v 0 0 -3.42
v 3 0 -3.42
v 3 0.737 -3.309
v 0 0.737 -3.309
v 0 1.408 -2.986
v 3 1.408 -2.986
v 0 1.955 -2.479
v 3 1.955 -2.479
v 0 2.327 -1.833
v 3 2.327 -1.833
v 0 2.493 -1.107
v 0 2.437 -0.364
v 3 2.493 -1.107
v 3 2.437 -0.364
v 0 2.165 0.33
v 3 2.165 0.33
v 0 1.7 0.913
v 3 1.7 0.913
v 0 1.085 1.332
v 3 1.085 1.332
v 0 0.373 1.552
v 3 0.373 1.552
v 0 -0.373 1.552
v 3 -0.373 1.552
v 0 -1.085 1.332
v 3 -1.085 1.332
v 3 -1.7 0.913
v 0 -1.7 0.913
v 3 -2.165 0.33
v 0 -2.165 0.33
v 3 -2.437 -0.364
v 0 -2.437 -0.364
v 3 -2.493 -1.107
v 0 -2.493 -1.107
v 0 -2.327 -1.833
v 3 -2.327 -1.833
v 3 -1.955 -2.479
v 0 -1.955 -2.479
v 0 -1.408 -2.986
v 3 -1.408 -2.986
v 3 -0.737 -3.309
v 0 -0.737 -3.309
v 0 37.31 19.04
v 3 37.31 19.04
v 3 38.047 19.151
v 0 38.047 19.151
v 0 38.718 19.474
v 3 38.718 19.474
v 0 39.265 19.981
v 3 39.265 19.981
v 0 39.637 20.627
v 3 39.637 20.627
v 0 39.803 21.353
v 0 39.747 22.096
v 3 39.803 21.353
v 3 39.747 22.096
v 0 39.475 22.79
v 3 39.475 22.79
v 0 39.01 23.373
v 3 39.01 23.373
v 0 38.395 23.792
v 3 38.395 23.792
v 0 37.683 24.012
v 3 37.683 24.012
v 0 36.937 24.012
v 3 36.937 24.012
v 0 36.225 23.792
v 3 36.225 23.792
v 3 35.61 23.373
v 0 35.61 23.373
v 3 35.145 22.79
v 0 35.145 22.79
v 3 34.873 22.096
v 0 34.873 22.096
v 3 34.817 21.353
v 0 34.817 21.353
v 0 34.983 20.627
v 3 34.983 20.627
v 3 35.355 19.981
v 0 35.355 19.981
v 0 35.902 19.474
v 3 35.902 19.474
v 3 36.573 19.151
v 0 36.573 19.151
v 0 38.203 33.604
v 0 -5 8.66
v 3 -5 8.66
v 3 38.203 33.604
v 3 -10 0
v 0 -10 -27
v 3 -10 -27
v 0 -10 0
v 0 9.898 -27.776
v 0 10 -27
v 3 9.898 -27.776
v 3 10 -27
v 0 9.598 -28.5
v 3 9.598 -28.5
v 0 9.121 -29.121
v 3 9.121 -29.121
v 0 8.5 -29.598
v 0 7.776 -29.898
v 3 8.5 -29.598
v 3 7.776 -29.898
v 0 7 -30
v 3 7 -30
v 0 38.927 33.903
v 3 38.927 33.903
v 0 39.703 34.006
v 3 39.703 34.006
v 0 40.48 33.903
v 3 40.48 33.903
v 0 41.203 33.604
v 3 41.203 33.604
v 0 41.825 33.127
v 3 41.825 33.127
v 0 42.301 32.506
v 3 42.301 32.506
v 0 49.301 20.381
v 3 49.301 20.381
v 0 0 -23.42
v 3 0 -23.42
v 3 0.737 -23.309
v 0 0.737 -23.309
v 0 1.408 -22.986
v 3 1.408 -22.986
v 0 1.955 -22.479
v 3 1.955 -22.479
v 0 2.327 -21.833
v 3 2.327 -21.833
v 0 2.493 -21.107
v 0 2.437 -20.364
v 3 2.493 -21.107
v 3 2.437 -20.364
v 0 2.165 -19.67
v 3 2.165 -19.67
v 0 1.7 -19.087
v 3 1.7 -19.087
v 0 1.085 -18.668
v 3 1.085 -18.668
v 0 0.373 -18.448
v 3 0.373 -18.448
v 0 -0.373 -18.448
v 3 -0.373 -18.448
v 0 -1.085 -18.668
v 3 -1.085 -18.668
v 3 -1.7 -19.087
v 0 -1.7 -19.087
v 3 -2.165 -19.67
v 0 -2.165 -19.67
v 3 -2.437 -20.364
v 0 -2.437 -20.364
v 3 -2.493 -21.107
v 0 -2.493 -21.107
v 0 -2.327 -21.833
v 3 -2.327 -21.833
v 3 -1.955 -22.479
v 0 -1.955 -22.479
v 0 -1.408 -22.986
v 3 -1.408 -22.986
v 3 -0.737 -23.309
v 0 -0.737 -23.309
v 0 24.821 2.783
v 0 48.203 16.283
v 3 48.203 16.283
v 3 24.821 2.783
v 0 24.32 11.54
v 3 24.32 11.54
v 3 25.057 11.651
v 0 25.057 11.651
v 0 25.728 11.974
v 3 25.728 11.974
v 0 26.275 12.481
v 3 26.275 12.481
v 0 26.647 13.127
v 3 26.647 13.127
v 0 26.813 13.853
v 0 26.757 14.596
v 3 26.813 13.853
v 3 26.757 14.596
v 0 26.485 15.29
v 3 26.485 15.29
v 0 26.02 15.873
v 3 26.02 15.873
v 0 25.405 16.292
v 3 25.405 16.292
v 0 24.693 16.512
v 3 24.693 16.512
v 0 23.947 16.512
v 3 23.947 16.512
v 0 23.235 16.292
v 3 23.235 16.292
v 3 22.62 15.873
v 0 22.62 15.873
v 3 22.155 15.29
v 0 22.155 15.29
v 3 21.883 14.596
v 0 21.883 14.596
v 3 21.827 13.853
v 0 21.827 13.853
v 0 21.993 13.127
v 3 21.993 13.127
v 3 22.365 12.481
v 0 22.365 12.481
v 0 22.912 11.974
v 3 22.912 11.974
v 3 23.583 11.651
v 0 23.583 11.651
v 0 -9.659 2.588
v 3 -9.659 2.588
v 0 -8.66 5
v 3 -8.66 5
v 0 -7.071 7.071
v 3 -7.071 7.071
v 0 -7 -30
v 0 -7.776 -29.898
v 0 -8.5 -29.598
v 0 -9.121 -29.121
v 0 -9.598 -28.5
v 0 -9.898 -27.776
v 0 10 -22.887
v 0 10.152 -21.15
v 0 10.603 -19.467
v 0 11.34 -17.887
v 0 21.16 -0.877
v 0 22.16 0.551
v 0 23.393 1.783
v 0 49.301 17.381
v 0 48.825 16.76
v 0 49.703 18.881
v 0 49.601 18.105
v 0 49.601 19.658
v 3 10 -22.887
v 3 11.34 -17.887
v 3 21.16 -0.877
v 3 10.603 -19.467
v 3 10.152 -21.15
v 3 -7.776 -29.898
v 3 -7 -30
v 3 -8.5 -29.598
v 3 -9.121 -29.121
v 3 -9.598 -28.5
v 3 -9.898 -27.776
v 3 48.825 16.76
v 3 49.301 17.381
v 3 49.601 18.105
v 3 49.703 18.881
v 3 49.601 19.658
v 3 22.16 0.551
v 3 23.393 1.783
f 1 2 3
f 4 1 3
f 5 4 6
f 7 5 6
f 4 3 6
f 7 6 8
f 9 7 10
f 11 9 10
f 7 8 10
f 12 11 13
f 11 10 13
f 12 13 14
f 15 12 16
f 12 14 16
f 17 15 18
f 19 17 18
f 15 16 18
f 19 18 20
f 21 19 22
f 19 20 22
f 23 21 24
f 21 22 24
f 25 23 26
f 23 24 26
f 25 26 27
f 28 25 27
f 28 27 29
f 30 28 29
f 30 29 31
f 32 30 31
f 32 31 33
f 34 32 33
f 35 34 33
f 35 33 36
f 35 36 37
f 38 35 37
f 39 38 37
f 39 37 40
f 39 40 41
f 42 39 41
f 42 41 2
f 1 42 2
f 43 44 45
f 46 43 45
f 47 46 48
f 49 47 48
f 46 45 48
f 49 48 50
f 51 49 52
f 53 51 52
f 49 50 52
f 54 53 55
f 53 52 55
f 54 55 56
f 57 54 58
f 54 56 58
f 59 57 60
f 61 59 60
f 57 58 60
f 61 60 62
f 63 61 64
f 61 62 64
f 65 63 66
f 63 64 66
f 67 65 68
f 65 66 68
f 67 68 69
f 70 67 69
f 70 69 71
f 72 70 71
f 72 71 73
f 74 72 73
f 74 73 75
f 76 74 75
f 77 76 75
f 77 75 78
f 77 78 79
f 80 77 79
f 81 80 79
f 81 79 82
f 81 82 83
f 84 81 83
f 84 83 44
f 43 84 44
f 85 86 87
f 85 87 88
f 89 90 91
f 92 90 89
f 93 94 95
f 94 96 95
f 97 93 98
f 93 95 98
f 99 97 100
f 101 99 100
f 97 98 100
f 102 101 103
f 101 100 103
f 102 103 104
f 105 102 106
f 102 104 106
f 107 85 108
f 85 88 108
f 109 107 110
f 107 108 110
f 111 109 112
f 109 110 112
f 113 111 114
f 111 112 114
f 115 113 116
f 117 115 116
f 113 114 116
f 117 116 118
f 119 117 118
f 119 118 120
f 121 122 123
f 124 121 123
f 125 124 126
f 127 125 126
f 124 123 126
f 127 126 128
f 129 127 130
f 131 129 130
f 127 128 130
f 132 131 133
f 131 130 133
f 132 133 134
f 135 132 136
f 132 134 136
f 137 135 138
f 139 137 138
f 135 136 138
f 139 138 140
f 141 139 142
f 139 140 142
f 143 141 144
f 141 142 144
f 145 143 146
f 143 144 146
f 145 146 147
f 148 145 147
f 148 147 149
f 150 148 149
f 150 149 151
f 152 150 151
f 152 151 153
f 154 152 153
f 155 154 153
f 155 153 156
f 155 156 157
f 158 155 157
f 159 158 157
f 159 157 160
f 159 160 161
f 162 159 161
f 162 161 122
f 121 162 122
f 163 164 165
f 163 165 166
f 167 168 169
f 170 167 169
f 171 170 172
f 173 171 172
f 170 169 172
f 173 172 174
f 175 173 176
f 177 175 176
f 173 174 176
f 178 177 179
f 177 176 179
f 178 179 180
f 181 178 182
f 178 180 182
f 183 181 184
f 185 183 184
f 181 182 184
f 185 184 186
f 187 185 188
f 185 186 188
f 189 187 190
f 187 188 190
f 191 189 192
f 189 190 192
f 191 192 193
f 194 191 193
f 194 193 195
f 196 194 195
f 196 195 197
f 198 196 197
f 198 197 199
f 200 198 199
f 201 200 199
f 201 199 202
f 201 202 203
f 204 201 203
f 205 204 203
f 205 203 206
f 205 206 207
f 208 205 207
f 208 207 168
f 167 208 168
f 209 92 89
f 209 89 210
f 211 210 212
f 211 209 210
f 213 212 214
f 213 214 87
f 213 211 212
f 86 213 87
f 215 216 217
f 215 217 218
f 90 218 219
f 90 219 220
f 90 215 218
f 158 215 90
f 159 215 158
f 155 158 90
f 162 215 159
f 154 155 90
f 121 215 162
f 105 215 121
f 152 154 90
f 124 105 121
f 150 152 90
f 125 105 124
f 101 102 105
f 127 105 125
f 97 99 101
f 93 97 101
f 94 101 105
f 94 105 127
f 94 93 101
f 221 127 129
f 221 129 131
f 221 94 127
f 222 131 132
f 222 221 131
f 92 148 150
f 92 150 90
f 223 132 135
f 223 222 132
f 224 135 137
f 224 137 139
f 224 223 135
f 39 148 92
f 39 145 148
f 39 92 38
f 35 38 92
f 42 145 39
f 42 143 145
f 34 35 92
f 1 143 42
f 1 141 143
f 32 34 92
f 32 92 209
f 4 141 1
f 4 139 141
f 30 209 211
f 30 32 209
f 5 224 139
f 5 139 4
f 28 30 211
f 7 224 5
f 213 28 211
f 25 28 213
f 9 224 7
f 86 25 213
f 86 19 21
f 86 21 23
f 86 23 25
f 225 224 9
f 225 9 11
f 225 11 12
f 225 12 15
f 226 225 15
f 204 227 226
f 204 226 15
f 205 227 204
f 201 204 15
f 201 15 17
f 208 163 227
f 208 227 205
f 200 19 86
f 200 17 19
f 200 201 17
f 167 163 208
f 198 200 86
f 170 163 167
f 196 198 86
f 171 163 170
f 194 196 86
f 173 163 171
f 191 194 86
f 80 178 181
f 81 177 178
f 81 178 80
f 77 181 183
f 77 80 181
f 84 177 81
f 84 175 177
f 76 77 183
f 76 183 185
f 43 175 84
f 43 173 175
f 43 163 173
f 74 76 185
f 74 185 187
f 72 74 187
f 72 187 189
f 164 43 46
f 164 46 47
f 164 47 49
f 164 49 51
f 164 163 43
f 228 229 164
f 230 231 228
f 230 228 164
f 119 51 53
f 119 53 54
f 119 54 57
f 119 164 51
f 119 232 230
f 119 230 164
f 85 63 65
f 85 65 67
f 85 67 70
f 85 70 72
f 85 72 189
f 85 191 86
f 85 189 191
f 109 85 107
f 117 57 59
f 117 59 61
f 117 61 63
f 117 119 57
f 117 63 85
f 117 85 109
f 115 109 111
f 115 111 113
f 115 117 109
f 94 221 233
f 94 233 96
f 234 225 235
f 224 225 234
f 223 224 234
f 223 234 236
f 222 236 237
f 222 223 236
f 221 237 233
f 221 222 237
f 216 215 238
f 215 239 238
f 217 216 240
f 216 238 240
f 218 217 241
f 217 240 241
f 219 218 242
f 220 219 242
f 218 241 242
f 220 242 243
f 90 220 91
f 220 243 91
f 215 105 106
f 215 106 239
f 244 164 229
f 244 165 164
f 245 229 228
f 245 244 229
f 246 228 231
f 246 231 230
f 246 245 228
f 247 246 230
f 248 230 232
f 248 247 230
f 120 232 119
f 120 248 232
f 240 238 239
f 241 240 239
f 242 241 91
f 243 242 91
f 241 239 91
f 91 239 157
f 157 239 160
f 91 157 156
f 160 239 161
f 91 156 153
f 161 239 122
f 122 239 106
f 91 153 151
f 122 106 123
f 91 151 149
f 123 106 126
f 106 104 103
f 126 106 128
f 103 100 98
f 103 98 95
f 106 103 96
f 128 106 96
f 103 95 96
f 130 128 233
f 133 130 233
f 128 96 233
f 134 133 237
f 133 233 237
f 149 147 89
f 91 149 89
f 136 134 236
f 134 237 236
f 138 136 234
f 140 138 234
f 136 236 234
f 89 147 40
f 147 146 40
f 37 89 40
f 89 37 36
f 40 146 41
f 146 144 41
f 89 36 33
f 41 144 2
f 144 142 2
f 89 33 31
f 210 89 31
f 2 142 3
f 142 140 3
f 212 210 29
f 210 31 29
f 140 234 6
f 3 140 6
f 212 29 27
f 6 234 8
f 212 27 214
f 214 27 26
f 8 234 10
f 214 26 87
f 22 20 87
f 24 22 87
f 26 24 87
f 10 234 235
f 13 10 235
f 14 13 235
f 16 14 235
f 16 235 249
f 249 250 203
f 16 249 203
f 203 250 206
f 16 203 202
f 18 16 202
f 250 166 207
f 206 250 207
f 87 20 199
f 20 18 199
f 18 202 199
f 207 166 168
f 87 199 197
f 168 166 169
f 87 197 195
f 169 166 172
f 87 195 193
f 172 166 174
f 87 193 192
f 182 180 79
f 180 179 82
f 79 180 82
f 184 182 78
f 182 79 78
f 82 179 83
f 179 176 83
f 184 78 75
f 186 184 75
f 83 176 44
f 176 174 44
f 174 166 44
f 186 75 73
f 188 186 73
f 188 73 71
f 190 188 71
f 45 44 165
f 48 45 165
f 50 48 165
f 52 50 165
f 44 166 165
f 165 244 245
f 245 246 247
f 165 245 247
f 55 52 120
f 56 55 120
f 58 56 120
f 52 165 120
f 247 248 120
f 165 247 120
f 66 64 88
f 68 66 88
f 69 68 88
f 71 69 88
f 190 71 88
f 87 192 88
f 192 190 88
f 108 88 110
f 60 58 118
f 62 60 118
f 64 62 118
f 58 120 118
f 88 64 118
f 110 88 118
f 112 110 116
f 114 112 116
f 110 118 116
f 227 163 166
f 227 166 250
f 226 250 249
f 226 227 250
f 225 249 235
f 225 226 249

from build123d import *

# Parameters (mm, degrees)
BOSS_EXTRUDE1_DEPTH = 3
SKETCH2_R           = 2.5
CUT_EXTRUDE1_DEPTH  = 62.822600008
FILLET1_R           = 3


with BuildPart() as part:
    # Sketch1 → Boss-Extrude1 (new body)
    with BuildSketch(Plane(origin=(0, 0, 0), x_dir=(0, 0, -1), z_dir=(1, 0, 0))):
        with BuildLine():
            Line((22.886751346, 10), (30, 10))
            Line((30, 10), (30, -10))
            Line((30, -10), (0, -10))
            ThreePointArc((0, -10), (-5, -8.660254038), (-8.660254038, -5))
            Line((-8.660254038, -5), (-35.103629711, 40.801270189))
            Line((-35.103629711, 40.801270189), (-17.783121635, 50.801270189))
            Line((-17.783121635, 50.801270189), (-2.783121635, 24.820508076))
            ThreePointArc((-2.783121635, 24.820508076), (-1.193935409, 22.749440264), (0.877132403, 21.160254038))
            Line((0.877132403, 21.160254038), (17.886751346, 11.339745962))
            ThreePointArc((17.886751346, 11.339745962), (20.298560895, 10.340741737), (22.886751346, 10))
        make_face()
    extrude(amount=BOSS_EXTRUDE1_DEPTH)

    # Sketch2 → Cut-Extrude1 (cut, through all)
    with BuildSketch(Plane(origin=(3, 0, 0), x_dir=(0, 0, -1), z_dir=(1, 0, 0))):
        with Locations((20.92, 0)):
            Circle(SKETCH2_R)
        with Locations((0.92, 0)):
            Circle(SKETCH2_R)
        with Locations((-14.04, 24.32)):
            Circle(SKETCH2_R)
        with Locations((-21.54, 37.31)):
            Circle(SKETCH2_R)
    extrude(amount=-CUT_EXTRUDE1_DEPTH, mode=Mode.SUBTRACT)

    # Fillet1
    fillet1_edges = [part.edges().sort_by_distance(p)[0] for p in [
        (1.5, 50.801270189, 17.783121635),
        (1.5, 10, -30),
        (1.5, -10, -30),
        (1.5, 40.801270189, 35.103629711),
    ]]
    fillet(fillet1_edges, radius=FILLET1_R)


solid = part.part
